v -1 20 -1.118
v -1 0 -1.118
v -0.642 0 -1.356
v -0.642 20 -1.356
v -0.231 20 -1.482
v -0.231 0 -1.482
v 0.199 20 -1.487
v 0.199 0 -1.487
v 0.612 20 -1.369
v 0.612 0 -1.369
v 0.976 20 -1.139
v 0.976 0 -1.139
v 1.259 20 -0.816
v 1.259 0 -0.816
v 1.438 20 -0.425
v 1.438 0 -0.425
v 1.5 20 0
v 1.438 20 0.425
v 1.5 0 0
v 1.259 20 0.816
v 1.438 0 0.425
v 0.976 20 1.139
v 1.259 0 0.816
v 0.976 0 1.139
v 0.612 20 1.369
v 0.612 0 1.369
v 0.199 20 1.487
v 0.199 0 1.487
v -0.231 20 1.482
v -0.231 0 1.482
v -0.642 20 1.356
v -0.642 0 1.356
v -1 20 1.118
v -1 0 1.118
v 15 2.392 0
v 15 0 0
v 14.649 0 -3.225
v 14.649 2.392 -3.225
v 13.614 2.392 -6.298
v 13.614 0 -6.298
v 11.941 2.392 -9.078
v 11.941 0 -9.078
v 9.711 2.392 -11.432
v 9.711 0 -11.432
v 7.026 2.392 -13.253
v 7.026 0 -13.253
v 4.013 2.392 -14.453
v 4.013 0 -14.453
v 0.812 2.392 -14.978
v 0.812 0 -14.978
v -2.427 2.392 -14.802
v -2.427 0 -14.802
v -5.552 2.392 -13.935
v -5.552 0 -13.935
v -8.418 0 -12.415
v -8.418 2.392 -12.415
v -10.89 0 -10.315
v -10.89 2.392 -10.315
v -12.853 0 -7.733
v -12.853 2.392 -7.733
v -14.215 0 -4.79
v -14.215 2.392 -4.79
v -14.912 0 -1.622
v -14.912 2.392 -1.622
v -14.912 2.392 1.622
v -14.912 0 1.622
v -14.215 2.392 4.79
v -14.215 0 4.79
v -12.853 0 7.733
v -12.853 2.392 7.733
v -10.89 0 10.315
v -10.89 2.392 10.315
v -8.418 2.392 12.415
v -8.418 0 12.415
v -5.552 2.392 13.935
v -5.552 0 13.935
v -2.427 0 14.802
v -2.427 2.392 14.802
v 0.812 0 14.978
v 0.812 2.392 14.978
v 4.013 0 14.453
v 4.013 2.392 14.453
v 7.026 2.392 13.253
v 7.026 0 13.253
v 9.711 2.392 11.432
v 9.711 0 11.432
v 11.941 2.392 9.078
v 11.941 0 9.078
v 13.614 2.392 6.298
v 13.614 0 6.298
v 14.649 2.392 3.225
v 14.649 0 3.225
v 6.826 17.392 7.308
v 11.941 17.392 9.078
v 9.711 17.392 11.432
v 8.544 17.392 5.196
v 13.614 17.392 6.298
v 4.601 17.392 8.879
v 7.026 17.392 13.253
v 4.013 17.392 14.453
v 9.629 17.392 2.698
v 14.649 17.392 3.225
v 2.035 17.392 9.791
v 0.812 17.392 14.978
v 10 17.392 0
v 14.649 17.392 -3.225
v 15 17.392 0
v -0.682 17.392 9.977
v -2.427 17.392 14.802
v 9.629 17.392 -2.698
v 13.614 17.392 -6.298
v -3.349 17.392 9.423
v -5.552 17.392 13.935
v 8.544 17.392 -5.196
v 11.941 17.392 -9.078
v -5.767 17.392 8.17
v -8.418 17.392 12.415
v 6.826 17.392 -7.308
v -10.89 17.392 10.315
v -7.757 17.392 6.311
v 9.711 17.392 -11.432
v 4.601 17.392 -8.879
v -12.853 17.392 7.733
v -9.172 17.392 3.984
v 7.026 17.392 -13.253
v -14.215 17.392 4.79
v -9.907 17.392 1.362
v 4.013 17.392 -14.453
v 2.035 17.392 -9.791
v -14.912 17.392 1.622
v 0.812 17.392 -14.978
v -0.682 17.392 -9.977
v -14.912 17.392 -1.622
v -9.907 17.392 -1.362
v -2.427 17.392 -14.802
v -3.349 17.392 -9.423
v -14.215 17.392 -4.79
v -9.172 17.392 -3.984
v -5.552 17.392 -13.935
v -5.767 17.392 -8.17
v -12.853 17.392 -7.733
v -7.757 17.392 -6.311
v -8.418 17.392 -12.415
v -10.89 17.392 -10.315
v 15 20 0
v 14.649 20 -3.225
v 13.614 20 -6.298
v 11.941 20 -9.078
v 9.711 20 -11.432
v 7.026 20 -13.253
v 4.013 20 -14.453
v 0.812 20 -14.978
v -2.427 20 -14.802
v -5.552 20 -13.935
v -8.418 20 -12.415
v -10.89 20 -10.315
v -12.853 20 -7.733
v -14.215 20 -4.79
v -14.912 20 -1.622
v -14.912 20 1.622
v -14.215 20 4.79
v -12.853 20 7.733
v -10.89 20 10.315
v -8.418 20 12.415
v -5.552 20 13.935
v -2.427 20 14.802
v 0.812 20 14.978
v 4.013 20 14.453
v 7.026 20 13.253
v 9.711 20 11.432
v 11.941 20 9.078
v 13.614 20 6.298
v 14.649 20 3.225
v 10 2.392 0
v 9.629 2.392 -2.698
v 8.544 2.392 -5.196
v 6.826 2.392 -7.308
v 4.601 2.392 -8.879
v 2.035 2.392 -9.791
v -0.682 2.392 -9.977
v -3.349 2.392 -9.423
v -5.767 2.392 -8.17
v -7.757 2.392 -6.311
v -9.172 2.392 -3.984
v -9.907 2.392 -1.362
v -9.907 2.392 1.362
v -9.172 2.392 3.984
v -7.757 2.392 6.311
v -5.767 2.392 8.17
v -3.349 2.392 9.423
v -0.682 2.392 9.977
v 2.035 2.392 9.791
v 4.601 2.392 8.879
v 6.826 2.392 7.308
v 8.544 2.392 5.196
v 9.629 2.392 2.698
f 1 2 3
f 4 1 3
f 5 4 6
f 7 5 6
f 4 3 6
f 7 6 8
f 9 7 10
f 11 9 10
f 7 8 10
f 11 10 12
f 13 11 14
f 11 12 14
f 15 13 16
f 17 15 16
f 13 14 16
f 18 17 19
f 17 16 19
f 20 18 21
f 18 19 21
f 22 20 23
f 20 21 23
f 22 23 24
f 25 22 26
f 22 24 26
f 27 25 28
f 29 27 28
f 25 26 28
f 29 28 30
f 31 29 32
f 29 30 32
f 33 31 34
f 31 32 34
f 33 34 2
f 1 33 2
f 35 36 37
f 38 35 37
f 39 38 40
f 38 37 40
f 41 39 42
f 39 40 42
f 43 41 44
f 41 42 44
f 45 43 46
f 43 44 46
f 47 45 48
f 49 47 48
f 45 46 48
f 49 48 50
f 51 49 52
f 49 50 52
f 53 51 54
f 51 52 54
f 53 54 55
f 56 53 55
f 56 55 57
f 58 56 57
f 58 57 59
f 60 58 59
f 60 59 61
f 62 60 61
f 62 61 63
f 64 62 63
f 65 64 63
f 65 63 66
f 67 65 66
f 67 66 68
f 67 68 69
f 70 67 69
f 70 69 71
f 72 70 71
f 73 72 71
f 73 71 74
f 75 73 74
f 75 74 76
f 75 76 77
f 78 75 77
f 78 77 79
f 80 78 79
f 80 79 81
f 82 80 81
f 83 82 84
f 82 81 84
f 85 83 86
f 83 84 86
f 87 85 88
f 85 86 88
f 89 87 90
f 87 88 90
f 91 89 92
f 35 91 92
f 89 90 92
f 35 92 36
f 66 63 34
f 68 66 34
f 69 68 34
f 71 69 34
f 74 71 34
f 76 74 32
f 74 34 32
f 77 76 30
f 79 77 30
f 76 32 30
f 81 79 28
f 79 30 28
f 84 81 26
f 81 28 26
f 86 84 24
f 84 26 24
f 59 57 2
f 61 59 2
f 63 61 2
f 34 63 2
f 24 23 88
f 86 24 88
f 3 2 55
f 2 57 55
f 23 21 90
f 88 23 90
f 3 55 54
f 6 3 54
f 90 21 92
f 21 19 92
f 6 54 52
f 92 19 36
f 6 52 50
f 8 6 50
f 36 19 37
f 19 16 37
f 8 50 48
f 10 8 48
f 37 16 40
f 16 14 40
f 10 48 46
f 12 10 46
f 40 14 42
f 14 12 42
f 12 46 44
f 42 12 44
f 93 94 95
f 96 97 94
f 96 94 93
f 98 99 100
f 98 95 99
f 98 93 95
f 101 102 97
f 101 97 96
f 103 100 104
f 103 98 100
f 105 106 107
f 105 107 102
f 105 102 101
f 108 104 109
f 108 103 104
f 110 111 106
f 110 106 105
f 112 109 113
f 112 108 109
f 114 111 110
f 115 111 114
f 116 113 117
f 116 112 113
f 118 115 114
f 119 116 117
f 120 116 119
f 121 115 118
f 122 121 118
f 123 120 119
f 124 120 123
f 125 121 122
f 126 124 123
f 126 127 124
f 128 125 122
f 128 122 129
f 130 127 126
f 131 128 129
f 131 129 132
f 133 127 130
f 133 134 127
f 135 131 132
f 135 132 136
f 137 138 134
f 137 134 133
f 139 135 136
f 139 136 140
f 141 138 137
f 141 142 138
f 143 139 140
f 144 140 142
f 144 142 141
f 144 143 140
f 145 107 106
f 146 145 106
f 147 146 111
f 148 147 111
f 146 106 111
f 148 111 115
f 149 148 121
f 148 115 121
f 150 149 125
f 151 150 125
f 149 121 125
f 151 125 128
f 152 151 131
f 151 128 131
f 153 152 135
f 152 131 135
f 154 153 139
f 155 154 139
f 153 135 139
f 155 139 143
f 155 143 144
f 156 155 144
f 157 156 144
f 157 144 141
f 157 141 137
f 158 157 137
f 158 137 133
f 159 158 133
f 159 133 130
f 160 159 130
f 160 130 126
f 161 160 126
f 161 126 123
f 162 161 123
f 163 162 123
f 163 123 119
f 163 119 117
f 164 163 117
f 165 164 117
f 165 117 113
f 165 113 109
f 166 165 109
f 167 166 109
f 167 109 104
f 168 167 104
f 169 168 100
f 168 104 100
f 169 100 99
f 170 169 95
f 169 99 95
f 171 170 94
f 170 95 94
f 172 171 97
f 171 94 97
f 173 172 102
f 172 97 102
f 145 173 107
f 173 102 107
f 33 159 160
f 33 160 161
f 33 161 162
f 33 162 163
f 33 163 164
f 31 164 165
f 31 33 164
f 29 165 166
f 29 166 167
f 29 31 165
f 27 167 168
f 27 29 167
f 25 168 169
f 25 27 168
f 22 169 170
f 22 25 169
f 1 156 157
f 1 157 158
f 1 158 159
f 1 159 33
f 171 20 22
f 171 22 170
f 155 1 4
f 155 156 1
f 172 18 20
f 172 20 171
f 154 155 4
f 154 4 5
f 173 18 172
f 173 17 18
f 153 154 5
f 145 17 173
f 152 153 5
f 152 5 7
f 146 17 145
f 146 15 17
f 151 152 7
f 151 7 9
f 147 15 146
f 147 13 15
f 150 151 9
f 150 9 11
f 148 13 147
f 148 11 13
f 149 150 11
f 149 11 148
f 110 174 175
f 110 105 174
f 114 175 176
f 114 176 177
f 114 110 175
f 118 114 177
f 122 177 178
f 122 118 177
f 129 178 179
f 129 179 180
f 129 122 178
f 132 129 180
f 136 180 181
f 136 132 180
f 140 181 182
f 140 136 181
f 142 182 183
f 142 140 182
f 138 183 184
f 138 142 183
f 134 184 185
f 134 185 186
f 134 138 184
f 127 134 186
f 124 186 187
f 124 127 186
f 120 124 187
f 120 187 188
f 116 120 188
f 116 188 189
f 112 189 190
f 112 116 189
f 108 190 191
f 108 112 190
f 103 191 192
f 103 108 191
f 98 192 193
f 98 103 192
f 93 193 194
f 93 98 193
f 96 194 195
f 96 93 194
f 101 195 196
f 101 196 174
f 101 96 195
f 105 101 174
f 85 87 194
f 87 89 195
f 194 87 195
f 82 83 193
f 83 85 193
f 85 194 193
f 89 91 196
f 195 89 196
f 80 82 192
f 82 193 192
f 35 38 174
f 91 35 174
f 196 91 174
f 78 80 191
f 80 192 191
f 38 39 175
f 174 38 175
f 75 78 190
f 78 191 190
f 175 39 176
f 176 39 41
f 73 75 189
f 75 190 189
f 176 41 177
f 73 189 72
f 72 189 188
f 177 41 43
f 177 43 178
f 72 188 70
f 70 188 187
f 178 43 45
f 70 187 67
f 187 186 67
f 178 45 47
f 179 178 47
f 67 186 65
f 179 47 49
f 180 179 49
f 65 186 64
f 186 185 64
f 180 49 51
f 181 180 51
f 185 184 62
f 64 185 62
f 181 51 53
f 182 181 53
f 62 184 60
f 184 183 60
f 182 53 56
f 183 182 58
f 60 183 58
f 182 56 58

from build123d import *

# Parameters (mm, degrees)
SKETCH_1_R      = 15
EXTRUDE_1_DEPTH = 20
SKETCH_2_W      = 5
SKETCH_2_H      = 15


with BuildPart() as part:
    # 草图1 → 凸台-拉伸1 (new body)
    with BuildSketch(Plane(origin=(0, 0, 0), x_dir=(1, 0, 0), z_dir=(0, 1, 0))):
        Circle(SKETCH_1_R)
        with BuildLine():
            Line((-1, -1.118033989), (-1, 1.118033989))
            ThreePointArc((-1, 1.118033989), (1.5, 0), (-1, -1.118033989))
        make_face(mode=Mode.SUBTRACT)
    extrude(amount=EXTRUDE_1_DEPTH)

    # 草图2 → 切除-旋转1 (revolve, cut)
    with BuildSketch(Plane.XY):
        with Locations((12.5, 9.892021361)):
            Rectangle(SKETCH_2_W, SKETCH_2_H)
    revolve(axis=Axis((0, 0, 0), (0, 1, 0)), mode=Mode.SUBTRACT)


solid = part.part
